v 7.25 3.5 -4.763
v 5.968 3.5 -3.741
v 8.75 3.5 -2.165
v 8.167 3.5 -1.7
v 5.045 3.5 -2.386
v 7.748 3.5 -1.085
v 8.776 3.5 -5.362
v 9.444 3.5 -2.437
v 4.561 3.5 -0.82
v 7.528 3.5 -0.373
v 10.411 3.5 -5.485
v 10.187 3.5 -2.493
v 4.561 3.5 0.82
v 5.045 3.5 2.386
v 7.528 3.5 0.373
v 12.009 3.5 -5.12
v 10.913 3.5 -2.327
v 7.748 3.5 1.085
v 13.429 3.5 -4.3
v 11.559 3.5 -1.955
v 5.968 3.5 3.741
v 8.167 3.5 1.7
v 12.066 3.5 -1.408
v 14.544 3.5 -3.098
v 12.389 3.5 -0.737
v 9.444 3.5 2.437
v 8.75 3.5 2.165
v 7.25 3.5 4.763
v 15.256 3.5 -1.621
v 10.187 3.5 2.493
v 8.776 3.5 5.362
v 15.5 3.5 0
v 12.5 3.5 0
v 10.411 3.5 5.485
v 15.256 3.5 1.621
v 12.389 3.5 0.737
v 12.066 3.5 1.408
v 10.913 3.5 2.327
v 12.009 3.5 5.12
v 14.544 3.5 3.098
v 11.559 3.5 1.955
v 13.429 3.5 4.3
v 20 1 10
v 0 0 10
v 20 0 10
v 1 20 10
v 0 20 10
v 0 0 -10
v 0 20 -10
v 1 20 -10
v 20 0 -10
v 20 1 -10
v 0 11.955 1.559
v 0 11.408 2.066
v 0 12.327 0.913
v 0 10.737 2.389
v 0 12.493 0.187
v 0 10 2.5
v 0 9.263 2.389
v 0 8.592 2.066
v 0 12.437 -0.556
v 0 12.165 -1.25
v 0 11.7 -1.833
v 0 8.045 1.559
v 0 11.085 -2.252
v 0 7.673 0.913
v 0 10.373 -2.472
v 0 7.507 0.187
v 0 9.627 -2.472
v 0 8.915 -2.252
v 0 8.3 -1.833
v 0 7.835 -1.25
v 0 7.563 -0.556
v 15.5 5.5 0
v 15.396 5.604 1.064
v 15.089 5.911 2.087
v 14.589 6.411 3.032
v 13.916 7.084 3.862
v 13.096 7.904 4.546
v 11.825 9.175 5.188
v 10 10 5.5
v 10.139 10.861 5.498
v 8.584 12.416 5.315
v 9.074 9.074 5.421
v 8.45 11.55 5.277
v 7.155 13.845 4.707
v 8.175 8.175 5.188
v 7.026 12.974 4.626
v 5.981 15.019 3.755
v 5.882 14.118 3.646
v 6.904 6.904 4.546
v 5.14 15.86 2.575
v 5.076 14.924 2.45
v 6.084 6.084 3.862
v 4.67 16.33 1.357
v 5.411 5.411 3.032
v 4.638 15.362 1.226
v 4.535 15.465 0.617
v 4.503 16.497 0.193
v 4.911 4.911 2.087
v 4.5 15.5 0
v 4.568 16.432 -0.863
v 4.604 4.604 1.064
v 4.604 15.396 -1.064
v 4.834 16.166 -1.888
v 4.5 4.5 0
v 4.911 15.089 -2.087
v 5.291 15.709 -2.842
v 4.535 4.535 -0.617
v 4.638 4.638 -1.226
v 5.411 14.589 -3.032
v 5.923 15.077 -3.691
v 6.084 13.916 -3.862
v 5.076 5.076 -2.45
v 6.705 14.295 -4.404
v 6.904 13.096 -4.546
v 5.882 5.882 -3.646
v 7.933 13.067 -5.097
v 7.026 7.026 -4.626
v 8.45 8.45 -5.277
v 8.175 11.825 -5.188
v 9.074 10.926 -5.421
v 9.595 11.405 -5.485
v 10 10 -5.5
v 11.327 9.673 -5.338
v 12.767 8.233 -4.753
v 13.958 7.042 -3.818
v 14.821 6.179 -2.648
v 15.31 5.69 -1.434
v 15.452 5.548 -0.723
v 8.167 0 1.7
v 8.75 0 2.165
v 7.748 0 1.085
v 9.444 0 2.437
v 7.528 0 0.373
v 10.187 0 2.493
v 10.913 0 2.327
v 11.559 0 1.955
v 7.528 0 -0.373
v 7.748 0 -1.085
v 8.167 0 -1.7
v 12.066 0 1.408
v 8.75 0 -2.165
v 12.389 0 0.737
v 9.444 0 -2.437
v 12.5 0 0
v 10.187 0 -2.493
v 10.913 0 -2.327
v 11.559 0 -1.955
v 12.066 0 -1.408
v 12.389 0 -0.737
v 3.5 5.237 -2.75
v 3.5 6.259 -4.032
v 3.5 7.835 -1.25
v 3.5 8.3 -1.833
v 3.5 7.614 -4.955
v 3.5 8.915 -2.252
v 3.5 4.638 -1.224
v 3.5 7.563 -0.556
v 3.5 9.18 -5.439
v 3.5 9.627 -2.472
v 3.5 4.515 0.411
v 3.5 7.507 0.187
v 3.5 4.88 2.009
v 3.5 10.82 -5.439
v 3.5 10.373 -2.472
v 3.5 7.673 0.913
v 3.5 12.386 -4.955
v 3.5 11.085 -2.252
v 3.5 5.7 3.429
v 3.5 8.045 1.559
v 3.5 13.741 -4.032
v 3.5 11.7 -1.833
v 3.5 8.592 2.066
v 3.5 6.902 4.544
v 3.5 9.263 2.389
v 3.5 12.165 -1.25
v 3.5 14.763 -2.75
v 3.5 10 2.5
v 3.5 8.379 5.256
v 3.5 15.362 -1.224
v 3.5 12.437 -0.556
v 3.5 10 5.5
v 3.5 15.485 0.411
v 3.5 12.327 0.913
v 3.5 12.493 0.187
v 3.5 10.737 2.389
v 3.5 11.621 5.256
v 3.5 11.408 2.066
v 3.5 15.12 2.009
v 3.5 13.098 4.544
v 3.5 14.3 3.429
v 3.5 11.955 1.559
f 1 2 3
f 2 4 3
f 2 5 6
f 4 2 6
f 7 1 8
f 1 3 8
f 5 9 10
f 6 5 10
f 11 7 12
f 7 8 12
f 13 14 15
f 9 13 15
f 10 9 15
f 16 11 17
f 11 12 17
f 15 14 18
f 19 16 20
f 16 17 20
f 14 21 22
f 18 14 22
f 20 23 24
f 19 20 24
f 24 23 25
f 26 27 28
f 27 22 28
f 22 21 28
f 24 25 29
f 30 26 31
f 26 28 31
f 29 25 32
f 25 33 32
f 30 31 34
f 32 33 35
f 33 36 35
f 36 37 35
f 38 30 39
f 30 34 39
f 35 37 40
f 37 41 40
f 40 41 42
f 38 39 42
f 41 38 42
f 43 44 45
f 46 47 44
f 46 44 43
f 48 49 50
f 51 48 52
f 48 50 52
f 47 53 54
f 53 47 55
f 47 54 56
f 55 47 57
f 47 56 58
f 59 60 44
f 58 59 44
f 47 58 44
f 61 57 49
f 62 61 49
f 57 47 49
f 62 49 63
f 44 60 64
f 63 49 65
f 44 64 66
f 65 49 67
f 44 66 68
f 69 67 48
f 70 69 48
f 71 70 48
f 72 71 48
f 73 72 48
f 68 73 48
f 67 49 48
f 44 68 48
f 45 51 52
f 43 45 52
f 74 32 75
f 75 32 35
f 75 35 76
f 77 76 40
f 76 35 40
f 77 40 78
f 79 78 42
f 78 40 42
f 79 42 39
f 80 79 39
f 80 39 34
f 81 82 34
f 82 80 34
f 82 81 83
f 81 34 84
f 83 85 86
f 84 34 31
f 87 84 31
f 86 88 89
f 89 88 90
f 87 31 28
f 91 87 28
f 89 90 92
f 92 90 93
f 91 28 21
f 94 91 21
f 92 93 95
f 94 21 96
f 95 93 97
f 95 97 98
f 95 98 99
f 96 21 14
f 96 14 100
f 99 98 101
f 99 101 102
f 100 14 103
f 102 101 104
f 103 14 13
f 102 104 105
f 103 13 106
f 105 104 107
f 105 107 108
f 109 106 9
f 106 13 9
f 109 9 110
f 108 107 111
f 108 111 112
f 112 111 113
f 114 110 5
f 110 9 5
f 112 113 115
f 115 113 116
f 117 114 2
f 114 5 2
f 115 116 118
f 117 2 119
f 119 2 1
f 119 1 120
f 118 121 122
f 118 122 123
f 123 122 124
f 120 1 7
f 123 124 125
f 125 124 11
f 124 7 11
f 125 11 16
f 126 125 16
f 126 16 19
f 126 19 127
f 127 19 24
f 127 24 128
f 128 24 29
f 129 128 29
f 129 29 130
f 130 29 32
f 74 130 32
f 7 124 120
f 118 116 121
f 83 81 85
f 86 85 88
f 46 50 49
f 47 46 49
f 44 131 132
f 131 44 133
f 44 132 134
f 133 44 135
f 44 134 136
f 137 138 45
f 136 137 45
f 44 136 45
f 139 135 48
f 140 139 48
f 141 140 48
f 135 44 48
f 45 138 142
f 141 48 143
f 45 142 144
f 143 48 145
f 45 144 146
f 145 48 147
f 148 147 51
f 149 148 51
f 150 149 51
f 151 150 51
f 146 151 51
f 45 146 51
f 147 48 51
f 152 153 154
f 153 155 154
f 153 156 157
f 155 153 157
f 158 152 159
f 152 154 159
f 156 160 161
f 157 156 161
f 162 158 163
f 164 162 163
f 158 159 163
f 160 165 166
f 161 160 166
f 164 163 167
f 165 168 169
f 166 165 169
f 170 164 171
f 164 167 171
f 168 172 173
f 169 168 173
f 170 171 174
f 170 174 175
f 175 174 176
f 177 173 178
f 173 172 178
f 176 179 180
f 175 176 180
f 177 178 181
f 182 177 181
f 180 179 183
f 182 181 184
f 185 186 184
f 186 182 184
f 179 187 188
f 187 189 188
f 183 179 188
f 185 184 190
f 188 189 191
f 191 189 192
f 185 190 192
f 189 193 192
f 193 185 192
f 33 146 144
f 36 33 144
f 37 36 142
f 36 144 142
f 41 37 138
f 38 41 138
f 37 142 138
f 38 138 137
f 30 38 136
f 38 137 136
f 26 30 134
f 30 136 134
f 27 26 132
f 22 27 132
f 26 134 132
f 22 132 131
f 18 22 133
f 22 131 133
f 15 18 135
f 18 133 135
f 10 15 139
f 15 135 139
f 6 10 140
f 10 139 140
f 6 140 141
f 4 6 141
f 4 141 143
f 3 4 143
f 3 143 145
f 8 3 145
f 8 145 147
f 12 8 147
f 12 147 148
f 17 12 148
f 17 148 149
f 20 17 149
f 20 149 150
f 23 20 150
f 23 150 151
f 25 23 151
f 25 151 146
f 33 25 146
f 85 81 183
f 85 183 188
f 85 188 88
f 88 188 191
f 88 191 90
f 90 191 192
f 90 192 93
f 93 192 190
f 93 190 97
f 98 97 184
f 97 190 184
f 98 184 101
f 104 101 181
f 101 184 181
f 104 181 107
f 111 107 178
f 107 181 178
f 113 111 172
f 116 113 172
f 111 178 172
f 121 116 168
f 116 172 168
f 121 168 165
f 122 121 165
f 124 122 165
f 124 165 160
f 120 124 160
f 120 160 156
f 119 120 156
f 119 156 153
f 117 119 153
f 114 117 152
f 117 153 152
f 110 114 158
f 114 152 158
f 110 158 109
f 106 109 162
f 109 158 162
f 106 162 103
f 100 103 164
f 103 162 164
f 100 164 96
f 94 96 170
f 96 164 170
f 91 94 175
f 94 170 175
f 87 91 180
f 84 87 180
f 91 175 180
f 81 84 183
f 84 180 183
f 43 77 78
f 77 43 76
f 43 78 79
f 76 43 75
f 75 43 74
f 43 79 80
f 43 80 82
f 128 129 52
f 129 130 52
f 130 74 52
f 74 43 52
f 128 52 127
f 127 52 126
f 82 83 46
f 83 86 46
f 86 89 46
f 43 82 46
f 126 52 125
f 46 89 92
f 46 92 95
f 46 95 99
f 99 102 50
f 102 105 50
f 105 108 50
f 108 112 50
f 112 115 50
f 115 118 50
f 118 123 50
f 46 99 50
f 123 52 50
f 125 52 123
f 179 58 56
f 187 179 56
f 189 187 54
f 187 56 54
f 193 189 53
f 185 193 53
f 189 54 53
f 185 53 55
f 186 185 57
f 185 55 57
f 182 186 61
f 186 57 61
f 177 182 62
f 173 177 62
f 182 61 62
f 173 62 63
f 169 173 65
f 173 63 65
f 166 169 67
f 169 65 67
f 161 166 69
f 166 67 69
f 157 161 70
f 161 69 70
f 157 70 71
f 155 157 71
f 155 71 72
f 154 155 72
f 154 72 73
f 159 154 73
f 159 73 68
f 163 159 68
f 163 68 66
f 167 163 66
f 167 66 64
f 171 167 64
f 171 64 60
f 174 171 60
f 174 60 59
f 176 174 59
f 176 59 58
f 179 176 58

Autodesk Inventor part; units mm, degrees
ref_plane "YZ Plane" through (0, 0, 0) normal (1, 0, 0) x (0, 1, 0)
ref_plane "XZ Plane" through (0, 0, 0) normal (0, 1, 0) x (-1, 0, 0)
ref_plane "XY Plane" through (0, 0, 0) normal (0, 0, 1) x (1, 0, 0)
sketch "Sketch1" plane through (0, 0, 0) normal (0, 0, 1) x (1, 0, 0)
  line L0 (0, 0) -> (20, 0)
  line L1 (20, 0) -> (20, 1)
  line L2 (20, 1) -> (1, 20)
  line L3 (1, 20) -> (0, 20)
  line L4 (0, 20) -> (0, 0)
  dimension "d0" = 135
  dimension "d1" = 20
  dimension "d2" = 20
  dimension "d3" = 1
extrude "Extrusion1" add sketch "Sketch1" along normal mid plane 20
sketch "Sketch2" plane through (0, 0, 10) normal (0, -1, 0) x (1, 0, 0)
  circle A0 centre (10, -10) radius 2.5
  point P0 (0, -10)
  dimension "d6" = 5
extrude "Extrusion2" cut sketch "Sketch2" against normal blind 3.5
sketch "Sketch3" plane through (10, 3.5, 0) normal (0, -1, 0) x (1, 0, 0)
  circle A0 centre (0, 0) radius 2.5 projected
  circle A1 centre (0, 0) radius 5.5
  point P0 (-10, 0)
  dimension "d9" = 11
extrude "Extrusion3" cut sketch "Sketch3" against normal up to next contours A0 | A1
sketch "Sketch4" plane through (0, 0, 10) normal (-1, 0, 0) x (0, 0, 1)
  circle A0 centre (-10, 10) radius 2.5
  point P0 (-10, 0)
  dimension "d12" = 5
extrude "Extrusion4" cut sketch "Sketch4" against normal blind 3.5
sketch "Sketch5" plane through (3.5, 10, 0) normal (-1, 0, 0) x (0, 0, 1)
  circle A0 centre (0, 0) radius 2.5 projected
  circle A1 centre (0, 0) radius 5.5
  point P0 (0, -10)
  dimension "d15" = 11
extrude "Extrusion5" cut sketch "Sketch5" against normal up to next contours A0 | A1
properties part number "Black Angle Corner Connector"
